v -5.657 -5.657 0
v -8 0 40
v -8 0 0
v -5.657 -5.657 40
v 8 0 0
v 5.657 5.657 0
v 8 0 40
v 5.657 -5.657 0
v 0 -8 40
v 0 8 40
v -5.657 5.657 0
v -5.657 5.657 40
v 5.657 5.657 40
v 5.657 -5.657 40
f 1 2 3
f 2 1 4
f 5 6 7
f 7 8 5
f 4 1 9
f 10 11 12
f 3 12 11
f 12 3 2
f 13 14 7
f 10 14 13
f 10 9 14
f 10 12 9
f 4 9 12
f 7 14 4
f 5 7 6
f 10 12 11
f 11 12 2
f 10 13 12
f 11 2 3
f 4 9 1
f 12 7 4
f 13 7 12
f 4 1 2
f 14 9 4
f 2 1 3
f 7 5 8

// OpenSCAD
color([0.4,0.7,1]) difference() {
 cylinder(h=40,r=8,$fn=8);
 rotate([0,0.000001,0]) cylinder(h=40,r=8,$fn=8);
}
